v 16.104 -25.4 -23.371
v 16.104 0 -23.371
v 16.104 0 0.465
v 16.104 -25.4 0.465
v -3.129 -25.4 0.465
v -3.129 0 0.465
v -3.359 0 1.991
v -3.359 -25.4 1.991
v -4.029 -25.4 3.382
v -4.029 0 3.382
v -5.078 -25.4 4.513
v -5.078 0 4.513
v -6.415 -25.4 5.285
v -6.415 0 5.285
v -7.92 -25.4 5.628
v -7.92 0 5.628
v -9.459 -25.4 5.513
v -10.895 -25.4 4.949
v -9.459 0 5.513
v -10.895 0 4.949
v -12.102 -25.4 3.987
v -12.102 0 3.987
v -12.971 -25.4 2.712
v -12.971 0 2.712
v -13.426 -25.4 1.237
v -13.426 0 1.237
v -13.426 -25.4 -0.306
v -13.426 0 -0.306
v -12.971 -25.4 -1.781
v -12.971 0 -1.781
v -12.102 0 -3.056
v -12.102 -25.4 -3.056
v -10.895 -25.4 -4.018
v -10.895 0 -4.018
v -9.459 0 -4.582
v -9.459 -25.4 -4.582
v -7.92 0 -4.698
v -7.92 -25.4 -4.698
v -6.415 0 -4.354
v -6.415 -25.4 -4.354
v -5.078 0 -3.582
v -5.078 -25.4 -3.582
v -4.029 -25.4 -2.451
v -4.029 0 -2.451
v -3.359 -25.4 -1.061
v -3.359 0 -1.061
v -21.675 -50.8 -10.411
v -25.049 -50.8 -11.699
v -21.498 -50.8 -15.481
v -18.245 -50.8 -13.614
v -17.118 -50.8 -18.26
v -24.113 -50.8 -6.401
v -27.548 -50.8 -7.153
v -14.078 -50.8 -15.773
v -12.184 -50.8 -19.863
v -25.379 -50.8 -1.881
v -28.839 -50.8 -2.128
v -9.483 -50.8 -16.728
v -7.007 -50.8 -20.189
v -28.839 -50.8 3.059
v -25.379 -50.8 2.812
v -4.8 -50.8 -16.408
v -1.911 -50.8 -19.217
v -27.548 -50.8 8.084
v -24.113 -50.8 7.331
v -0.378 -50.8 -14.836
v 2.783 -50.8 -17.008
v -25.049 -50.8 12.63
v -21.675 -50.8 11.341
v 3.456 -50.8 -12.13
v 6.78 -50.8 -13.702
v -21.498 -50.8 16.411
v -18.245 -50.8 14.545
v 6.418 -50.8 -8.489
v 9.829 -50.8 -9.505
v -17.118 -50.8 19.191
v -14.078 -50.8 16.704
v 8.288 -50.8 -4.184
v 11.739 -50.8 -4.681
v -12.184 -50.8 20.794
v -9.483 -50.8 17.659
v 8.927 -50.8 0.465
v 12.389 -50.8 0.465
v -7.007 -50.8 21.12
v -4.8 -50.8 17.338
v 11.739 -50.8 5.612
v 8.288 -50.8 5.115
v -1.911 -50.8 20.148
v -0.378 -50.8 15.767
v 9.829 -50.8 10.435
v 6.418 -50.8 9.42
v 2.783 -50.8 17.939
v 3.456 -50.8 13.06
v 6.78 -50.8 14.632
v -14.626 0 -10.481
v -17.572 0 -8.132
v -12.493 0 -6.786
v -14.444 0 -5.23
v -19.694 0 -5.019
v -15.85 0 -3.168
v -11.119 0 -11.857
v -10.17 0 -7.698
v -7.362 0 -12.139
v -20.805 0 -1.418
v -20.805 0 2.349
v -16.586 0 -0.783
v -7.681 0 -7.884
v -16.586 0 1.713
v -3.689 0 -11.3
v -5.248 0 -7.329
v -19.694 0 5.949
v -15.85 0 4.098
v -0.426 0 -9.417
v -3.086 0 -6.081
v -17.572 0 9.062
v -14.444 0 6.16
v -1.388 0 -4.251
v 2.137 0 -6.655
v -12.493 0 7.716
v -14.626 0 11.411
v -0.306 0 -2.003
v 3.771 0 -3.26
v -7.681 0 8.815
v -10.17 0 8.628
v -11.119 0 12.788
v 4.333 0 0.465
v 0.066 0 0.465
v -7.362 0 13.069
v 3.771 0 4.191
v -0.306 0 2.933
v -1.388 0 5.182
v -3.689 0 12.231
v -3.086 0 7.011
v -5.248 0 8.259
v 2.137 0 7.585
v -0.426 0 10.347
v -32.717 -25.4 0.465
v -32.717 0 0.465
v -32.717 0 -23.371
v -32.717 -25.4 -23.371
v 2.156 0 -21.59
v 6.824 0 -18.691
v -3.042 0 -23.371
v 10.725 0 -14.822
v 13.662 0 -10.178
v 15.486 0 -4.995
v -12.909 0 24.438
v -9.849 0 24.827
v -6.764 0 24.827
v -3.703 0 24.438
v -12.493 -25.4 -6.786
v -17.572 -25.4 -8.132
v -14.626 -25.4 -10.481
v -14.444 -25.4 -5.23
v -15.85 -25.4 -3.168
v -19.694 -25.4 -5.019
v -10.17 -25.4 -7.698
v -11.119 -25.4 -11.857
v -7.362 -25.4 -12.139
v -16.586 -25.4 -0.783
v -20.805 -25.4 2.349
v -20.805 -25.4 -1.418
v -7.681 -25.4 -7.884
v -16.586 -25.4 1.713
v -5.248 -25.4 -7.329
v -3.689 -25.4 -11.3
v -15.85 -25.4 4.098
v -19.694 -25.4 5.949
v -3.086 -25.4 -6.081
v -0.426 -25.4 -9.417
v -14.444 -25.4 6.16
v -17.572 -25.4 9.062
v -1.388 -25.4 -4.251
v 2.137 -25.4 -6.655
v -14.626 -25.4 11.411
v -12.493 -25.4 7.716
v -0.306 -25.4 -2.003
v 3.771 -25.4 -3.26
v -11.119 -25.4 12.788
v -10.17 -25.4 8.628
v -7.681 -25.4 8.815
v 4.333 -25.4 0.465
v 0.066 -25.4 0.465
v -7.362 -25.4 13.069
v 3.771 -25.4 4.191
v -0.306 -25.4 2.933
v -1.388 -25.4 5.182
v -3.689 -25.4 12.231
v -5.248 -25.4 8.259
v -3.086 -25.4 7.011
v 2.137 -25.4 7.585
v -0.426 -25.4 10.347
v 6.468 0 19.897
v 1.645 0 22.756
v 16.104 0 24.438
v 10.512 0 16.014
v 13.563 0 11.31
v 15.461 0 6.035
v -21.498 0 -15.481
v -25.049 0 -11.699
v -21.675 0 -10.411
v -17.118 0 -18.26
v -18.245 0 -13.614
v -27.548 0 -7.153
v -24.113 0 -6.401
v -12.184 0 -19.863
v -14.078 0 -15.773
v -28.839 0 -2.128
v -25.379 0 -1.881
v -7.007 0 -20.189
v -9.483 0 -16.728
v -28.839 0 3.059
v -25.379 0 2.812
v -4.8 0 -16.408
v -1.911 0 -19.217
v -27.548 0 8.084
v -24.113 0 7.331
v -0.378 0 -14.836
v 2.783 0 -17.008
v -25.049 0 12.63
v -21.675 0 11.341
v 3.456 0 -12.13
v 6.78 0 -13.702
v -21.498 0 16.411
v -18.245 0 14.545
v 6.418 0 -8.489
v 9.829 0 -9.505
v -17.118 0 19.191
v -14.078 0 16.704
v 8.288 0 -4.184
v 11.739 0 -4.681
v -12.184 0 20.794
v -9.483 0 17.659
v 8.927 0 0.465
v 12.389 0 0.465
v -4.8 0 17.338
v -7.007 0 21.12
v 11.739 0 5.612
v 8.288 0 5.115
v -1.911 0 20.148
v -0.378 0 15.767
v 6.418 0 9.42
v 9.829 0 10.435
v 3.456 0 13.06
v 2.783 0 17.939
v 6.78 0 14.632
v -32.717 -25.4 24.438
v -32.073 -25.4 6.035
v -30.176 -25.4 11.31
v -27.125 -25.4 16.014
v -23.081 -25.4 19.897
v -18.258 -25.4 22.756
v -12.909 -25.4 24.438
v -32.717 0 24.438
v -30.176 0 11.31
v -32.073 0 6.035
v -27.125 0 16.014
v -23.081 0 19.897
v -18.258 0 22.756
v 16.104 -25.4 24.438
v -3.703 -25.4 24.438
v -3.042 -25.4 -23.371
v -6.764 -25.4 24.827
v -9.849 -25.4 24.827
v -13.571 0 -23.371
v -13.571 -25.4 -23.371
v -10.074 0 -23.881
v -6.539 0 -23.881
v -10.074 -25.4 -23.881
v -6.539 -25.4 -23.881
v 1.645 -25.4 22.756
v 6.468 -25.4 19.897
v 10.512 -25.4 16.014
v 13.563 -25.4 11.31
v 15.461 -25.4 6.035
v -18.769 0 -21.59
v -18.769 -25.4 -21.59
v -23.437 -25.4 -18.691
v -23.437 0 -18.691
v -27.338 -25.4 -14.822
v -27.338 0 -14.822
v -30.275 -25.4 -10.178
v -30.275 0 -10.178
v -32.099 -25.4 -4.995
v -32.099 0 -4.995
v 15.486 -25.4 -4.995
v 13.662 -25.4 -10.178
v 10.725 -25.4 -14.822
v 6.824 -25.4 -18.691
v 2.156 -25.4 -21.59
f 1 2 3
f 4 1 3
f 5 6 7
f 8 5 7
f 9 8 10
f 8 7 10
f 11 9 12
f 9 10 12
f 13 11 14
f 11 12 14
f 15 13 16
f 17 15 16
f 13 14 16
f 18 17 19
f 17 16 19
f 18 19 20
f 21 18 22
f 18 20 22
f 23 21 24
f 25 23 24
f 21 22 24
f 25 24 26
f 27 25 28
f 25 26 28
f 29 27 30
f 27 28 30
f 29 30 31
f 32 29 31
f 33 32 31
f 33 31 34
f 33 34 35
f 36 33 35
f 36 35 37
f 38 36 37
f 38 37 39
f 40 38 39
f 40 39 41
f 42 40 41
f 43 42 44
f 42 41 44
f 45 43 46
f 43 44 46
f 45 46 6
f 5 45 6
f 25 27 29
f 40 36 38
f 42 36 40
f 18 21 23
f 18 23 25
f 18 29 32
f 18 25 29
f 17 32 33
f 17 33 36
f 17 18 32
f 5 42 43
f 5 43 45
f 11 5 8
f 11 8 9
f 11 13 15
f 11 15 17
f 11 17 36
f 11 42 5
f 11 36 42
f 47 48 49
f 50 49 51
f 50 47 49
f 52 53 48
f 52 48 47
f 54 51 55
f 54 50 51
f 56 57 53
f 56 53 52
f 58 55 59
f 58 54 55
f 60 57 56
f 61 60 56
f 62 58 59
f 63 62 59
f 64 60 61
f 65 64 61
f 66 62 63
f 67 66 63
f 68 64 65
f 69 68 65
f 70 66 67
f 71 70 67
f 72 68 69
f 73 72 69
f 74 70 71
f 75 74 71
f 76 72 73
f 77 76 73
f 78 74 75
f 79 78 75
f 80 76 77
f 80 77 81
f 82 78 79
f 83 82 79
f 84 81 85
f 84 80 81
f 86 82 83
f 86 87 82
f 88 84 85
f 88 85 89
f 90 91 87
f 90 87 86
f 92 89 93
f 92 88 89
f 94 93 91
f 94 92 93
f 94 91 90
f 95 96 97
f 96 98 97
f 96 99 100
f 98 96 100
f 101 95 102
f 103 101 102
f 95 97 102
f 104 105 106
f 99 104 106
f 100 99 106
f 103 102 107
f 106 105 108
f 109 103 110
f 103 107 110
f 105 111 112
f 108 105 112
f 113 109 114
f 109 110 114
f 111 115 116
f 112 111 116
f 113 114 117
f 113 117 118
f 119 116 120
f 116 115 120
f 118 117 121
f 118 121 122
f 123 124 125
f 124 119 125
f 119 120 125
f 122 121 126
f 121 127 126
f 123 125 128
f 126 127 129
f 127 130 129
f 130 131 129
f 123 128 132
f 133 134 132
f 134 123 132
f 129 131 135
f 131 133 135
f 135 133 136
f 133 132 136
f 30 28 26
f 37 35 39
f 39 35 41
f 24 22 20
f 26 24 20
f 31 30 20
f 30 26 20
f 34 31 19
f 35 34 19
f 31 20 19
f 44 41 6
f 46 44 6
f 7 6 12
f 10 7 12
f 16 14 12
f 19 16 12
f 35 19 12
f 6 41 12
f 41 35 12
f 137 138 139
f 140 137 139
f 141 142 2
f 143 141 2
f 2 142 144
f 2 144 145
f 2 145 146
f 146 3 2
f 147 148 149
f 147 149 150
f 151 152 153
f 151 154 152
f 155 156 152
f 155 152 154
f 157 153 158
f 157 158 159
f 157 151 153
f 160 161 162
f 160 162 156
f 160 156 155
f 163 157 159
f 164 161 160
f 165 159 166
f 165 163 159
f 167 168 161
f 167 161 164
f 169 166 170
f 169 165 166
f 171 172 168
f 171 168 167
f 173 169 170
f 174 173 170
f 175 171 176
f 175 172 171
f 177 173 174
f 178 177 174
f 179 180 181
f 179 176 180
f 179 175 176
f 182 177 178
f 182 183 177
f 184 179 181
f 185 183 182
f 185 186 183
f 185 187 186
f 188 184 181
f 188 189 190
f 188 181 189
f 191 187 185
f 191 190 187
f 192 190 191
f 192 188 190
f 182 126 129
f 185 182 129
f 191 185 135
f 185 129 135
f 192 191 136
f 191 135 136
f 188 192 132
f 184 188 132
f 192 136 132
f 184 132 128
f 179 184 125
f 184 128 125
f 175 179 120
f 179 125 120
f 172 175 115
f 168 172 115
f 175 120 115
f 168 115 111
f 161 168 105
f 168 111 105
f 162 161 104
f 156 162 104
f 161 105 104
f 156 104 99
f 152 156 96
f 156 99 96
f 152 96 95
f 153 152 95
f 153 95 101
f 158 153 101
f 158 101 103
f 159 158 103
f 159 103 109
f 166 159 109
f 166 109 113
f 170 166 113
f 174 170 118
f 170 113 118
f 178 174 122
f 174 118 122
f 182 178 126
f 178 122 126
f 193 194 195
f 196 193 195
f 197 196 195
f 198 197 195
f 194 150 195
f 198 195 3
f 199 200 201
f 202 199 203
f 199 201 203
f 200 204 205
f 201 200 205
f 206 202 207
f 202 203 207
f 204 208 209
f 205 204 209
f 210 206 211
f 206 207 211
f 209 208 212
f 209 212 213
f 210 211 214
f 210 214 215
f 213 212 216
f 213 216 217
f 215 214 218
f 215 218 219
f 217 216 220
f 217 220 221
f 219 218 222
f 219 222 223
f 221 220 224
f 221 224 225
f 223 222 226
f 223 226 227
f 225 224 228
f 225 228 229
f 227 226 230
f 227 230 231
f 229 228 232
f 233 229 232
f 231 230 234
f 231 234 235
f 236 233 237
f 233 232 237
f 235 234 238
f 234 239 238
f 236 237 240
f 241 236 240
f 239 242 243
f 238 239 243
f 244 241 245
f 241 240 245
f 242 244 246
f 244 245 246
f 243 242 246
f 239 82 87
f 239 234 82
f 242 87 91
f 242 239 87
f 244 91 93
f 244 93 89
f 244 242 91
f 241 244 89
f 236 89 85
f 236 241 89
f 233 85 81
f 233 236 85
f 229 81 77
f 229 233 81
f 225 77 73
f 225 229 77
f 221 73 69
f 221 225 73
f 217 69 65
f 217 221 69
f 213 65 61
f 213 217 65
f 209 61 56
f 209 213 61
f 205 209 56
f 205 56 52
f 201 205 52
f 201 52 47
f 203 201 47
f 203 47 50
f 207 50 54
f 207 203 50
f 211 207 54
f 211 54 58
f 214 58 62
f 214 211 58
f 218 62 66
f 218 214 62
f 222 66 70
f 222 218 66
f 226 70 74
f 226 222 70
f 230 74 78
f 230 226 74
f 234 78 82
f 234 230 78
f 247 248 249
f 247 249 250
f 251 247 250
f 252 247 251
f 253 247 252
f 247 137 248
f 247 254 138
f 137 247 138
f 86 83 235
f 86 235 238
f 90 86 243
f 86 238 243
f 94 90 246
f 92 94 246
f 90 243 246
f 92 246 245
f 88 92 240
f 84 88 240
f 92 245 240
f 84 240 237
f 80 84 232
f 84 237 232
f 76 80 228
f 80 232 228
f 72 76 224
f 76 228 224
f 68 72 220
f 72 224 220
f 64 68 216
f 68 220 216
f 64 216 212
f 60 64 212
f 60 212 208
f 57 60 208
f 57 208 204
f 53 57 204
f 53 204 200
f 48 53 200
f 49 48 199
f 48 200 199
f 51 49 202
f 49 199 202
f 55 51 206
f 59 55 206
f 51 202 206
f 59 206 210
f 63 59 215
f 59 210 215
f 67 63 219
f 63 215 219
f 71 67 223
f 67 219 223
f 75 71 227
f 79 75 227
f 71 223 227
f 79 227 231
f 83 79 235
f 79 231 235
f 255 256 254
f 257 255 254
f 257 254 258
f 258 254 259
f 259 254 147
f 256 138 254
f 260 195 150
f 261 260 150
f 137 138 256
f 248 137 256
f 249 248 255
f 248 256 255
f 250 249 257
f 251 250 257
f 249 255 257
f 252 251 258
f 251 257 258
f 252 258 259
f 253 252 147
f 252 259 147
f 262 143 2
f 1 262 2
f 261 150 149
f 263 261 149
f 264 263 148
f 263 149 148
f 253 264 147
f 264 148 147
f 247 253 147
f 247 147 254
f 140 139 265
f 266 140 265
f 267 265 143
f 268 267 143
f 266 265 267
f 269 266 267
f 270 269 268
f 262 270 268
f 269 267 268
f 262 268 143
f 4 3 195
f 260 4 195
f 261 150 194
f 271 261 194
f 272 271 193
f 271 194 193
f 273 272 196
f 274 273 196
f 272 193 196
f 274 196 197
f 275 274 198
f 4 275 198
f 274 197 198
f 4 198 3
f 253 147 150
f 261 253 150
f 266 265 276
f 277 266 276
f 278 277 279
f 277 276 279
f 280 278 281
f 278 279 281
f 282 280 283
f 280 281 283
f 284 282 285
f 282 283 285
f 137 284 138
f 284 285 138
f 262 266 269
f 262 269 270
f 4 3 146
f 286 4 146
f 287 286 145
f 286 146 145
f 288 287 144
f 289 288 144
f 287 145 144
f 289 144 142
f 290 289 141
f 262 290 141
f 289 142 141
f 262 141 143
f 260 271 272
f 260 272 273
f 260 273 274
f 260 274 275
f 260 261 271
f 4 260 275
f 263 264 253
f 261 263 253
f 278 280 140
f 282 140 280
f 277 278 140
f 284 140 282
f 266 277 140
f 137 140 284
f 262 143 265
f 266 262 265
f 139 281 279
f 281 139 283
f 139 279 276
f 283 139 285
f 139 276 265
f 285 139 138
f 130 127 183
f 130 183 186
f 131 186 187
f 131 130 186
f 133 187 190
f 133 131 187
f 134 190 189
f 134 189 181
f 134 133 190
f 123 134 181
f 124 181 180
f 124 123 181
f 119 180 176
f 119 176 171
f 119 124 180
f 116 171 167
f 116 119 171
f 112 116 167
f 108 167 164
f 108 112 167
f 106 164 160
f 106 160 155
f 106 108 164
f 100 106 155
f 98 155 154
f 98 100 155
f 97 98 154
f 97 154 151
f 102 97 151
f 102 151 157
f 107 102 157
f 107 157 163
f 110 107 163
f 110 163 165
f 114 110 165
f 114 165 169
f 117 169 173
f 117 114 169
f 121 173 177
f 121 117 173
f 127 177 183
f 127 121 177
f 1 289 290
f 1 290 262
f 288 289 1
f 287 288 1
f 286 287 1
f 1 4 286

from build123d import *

# Parameters (mm, degrees)
F1_DEPTH = 25.4
F0_R     = 12.6394393626
F0_R_2   = 8.3728331527
F0_R_3   = 5.1773172291
F0_R_4   = 20.6953225865
F0_R_5   = 17.2335435778
F2_DEPTH = 25.4


# Not quite as in the source:
# - ends of sketch curves that miss each other by under 0.0002 mm in the source are joined
# - a feature names something its author has since deleted; it is built from what else it names


with BuildPart() as f1:
    # F0 (on Front) → F1 (new body)
    with BuildSketch(Plane.XZ):
        with BuildLine():
            Line((-12.9094741786, 24.4382098317), (-32.717242837, 24.4382098317))
            Line((-32.717242837, 24.4382098317), (-32.717242837, 0.4653259821))
            ThreePointArc((-32.717242837, 0.4653259821), (-27.1246627125, 16.0140143217), (-12.9094741786, 24.4382098317))
        make_face()
    extrude(amount=F1_DEPTH)


with BuildPart() as f1b:
    # F0 (on Front) → F1, piece 2 (new body)
    with BuildSketch(Plane.XZ):
        with BuildLine():
            ThreePointArc((-13.5706461069, -23.3711004257), (-27.3378712415, -14.8216567814), (-32.7172422573, 0.4653259821))
            Line((-32.7172422573, 0.4653259821), (-32.717242837, -23.3711004257))
            Line((-32.717242837, -23.3711004257), (-13.5706461069, -23.3711004257))
        make_face()
    extrude(amount=F1_DEPTH)


with BuildPart() as f1c:
    # F0 (on Front) → F1, piece 3 (new body)
    with BuildSketch(Plane.XZ):
        with BuildLine():
            ThreePointArc((-3.7034150665, 24.4382098317), (-8.3064446226, 24.8761236168), (-12.9094741786, 24.4382098317))
            Line((-12.9094741786, 24.4382098317), (-3.7034150665, 24.4382098317))
        make_face()
    extrude(amount=F1_DEPTH)


with BuildPart() as f1d:
    # F0 (on Front) → F1, piece 4 (new body)
    with BuildSketch(Plane.XZ):
        with BuildLine():
            Line((16.1043517292, 24.4382098317), (-3.7034150665, 24.4382098317))
            ThreePointArc((-3.7034150665, 24.4382098317), (10.5117734674, 16.0140143217), (16.1043530121, 0.4653259821))
            Line((16.1043530121, 0.4653259821), (16.1043517292, 24.4382098317))
        make_face()
    extrude(amount=F1_DEPTH)


with BuildPart() as f1e:
    # F0 (on Front) → F1, piece 5 (new body)
    with BuildSketch(Plane.XZ):
        with BuildLine():
            ThreePointArc((16.1043530121, 0.4653259821), (10.7249819964, -14.8216567814), (-3.0422431382, -23.3711004257))
            Line((-3.0422431382, -23.3711004257), (16.1043517292, -23.3711004257))
            Line((16.1043517292, -23.3711004257), (16.1043530121, 0.4653259821))
        make_face()
    extrude(amount=F1_DEPTH)


with BuildPart() as f1f:
    # F0 (on Front) → F1, piece 6 (new body)
    with BuildSketch(Plane.XZ):
        with BuildLine():
            Line((-3.0422431382, -23.3711004257), (-13.5706461069, -23.3711004257))
            ThreePointArc((-13.5706461069, -23.3711004257), (-8.3064446226, -23.9454716526), (-3.0422431382, -23.3711004257))
        make_face()
    extrude(amount=F1_DEPTH)


with BuildPart() as f1g:
    # F0 (on Front) → F1, piece 7 (new body)
    with BuildSketch(Plane.XZ):
        with Locations((-8.3064446226, 0.4653259821)):
            Circle(F0_R)
        with Locations((-8.3064446226, 0.4653259821)):
            Circle(F0_R_2, mode=Mode.SUBTRACT)
    extrude(amount=F1_DEPTH)


with BuildPart() as f1h:
    # F0 (on Front) → F1, piece 8 (new body)
    with BuildSketch(Plane.XZ):
        with Locations((-8.3064446226, 0.4653259821)):
            Circle(F0_R_3)
    extrude(amount=F1_DEPTH)


with BuildPart() as f1i:
    # F0 (on Front) → F1, piece 9 (new body)
    with BuildSketch(Plane.XZ):
        with Locations((-8.3064446226, 0.4653259821)):
            Circle(F0_R_4)
        with Locations((-8.3064446226, 0.4653259821)):
            Circle(F0_R_5, mode=Mode.SUBTRACT)
    extrude(amount=F1_DEPTH)

    # F2 (add): a face of the model
    f2_faces = [f1i.faces().sort_by_distance(p)[0] for p in [
        (-28.4164150914, -25.4, 0.4653259821),
    ]]
    extrude(f2_faces, amount=F2_DEPTH)


solid = Compound([f1.part, f1b.part, f1c.part, f1d.part, f1e.part, f1f.part, f1g.part, f1h.part, f1i.part])
